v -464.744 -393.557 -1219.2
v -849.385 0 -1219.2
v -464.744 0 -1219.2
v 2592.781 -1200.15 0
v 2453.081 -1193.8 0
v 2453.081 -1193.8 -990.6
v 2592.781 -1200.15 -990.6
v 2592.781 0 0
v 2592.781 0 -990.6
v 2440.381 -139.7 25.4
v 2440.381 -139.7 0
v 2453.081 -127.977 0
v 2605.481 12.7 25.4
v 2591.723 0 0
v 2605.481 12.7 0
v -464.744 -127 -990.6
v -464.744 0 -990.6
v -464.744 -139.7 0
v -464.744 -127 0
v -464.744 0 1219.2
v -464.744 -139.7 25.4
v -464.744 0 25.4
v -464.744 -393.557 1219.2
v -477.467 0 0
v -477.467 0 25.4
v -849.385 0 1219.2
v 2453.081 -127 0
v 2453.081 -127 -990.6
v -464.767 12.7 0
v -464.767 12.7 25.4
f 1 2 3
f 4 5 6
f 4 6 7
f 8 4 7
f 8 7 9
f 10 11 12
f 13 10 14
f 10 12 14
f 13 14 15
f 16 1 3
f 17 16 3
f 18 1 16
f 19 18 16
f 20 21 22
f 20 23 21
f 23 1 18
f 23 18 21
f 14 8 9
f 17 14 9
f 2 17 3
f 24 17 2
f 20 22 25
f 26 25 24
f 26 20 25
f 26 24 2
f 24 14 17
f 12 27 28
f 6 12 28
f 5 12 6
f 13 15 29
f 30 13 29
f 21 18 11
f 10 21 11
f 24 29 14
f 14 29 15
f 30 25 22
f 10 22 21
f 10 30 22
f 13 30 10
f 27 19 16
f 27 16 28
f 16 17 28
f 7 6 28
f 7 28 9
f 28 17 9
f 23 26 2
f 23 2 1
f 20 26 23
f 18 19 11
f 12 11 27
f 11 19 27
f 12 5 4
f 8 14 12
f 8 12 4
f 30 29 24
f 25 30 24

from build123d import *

# Parameters (mm, degrees)
F1_DEPTH = 990.6
F2_DEPTH = 1219.2
F4_DEPTH = 25.4


with BuildPart() as f1:
    # F0 (on Top) → F1 (new body)
    with BuildSketch(Plane.XY):
        Polygon((2592.781305, 0), (-464.743695, 0), (-464.743695, -127), (2453.081305, -127), (2453.081305, -1193.8), (2592.781305, -1200.15), align=None)
    extrude(amount=-F1_DEPTH)

    # F0 (on Top) → F2 (join, symmetric)
    with BuildSketch(Plane.XY):
        Polygon((-464.743695, 0), (-849.385236, 0), (-464.743695, -393.55716), (-464.743695, -127), align=None)
    extrude(amount=F2_DEPTH, both=True)

    # F3 (on face) → F4 (join)
    with BuildSketch(Plane.XY):
        Polygon((-464.767388, 0), (-464.767388, -139.7), (2440.381305, -139.7), (2605.481305, 12.7), (-464.767388, 12.7), (-477.467388, 0), align=None)
    extrude(amount=F4_DEPTH)


solid = f1.part
